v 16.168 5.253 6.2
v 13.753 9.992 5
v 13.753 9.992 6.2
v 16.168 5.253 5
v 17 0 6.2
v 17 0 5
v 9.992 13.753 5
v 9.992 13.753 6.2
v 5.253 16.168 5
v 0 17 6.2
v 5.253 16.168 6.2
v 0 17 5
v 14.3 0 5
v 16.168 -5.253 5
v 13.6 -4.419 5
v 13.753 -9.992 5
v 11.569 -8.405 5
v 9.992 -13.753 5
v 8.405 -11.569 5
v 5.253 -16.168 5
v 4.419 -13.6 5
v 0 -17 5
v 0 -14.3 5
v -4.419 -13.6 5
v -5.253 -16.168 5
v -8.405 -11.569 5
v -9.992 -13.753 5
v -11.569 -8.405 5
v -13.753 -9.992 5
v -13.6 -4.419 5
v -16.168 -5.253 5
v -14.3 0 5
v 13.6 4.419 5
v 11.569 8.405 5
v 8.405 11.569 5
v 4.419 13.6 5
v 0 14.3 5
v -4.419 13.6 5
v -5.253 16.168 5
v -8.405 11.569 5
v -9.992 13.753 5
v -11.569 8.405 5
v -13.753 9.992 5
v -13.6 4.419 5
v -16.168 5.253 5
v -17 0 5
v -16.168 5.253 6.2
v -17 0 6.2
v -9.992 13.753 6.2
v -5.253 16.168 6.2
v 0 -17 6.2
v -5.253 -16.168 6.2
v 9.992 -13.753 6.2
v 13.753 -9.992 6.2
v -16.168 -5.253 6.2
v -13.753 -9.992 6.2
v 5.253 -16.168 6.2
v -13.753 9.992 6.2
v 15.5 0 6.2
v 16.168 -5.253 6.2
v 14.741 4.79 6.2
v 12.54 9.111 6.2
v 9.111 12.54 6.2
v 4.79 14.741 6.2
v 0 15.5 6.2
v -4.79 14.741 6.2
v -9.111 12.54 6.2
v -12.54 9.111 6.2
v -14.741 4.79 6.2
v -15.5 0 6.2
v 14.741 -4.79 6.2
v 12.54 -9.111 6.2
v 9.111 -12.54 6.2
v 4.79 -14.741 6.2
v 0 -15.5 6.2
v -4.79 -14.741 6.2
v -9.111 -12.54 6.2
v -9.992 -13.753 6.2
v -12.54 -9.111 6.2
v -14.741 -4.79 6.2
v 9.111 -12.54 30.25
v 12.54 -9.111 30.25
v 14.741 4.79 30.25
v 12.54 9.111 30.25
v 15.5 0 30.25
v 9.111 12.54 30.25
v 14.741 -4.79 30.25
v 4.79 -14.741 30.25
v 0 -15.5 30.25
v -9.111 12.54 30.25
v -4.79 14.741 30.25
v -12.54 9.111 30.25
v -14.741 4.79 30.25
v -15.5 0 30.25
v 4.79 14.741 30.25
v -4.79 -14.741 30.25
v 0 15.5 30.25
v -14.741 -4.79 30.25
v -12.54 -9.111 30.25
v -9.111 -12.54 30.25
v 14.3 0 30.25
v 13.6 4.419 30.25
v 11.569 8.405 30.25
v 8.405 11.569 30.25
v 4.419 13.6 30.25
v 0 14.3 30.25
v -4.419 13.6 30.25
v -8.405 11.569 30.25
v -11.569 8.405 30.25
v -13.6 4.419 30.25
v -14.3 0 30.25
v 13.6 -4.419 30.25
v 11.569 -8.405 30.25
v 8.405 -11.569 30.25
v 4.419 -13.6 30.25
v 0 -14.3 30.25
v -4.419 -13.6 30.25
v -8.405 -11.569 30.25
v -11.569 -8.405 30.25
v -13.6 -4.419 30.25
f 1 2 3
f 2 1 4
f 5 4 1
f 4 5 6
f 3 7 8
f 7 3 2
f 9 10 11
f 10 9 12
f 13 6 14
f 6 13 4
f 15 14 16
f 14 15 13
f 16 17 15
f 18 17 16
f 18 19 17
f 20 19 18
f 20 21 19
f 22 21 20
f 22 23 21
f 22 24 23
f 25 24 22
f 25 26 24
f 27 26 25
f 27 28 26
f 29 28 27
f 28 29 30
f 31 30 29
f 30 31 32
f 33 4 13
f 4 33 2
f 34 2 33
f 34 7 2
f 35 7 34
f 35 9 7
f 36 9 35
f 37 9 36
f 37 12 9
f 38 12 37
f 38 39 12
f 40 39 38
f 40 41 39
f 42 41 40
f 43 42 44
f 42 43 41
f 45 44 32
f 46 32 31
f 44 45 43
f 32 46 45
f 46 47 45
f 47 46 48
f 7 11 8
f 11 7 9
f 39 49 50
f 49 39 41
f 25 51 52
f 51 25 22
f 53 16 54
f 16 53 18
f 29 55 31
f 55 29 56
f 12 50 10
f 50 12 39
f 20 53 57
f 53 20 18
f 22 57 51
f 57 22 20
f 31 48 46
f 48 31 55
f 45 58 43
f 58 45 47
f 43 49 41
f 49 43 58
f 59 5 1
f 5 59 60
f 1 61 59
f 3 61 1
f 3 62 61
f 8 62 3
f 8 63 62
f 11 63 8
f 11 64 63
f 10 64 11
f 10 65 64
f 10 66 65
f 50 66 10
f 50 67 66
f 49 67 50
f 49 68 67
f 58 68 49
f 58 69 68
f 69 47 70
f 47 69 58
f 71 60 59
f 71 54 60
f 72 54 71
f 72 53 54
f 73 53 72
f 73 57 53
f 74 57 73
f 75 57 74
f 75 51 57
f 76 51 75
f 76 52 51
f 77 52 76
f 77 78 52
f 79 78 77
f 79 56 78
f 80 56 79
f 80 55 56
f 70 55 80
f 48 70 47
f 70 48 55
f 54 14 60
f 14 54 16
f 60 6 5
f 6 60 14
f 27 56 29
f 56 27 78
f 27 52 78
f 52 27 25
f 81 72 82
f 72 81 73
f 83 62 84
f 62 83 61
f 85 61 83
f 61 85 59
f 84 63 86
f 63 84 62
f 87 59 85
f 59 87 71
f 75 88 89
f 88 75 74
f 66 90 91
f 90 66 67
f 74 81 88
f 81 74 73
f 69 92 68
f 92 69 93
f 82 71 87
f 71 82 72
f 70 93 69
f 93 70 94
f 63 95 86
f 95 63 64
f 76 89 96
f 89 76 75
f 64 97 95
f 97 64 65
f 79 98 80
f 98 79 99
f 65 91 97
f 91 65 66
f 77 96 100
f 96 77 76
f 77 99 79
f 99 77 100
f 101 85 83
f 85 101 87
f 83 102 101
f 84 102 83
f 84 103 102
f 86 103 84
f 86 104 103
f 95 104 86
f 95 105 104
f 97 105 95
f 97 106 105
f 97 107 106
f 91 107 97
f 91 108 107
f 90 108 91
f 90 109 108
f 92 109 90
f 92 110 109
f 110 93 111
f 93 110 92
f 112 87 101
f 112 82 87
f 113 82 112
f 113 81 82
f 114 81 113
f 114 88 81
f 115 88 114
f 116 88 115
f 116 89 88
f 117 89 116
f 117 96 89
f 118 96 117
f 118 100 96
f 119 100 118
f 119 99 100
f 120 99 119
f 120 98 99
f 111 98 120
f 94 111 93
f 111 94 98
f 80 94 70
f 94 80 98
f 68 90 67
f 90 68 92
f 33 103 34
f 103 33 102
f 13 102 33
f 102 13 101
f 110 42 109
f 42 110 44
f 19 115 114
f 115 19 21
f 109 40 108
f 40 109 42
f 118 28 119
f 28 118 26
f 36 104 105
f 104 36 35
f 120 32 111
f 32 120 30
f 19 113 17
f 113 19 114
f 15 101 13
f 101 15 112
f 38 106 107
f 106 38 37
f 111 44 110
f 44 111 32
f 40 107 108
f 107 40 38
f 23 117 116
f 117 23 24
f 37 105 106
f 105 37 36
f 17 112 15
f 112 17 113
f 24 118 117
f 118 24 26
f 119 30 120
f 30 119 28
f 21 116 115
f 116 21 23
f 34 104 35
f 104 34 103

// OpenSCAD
$fn=20;
//color([1,0,0]) colorbox();
color([0,0,1]) topcone();
//lid();

module colorbox(){
    difference(){union(){
    basebox();
    translate([(28.4-3.2)/2,(28.7-3.2)/2,2])cylinder(d=6,h=4,center=true);
    translate([(28.4-3.2)/2,-(28.7-3.2)/2,2])cylinder(d=6,h=4,center=true);
    translate([-(28.4-3.2)/2,(28.7-3.2)/2,2])cylinder(d=6,h=4,center=true);
    translate([-(28.4-3.2)/2,-(28.7-3.2)/2,2])cylinder(d=6,h=4,center=true);
    }
    translate([(28.4-3.2)/2,(28.7-3.2)/2,2])cylinder(d=2.4,h=5,center=true);
    translate([(28.4-3.2)/2,-(28.7-3.2)/2,2])cylinder(d=2.4,h=5,center=true);
    translate([-(28.4-3.2)/2,(28.7-3.2)/2,2])cylinder(d=2.4,h=5,center=true);
    translate([-(28.4-3.2)/2,-(28.7-3.2)/2,2])cylinder(d=2.4,h=5,center=true);
    translate([0,-(28.7-3.2)/2,0])cube([14,2,4],center=true);
    translate([0,(28.7-3.2)/2,0])cube([14,2,4],center=true);
    }
}


module lid(){
difference(){translate([-100+8,-48/2,0])import("bb-sen-uni-bt-c.stl");
    cylinder(h=20,d=32);
    translate([0,-20,(8-1.2)/2-0.205])cube([25,10,8-1.2],center=true);
    }
}
    
module topcone(){
    translate([0,0,5])difference()
    {union(){
        translate([0,0,0.6])cylinder(d=34,h=1.2,center=true);
        translate([0,0,25.25/2])cylinder(d=31,h=24+1.25,center=true);
        }
        translate([0,0,25.25/2])cylinder(d=31-2.4,h=24+1.25+0.2,center=true);
        }
    }
module basebox(){
    translate([-56/2,-48/2,0])difference(){linear_extrude(height=8) import("molebox.dxf",layer="0",convexity=10);
translate([0,0,1.25])linear_extrude(height=8) import("molebox.dxf",layer="innerbox",convexity=10);
translate([0,0,6.35])linear_extrude(height=8) import("molebox.dxf",layer="lid",convexity=10);
    translate([4,4,4]) doublehole();
    translate([4,4+16,4]) doublehole();
    translate([4,4+40,4]) doublehole();
    translate([4+48,4,4]) doublehole();
    translate([4+48,4+16,4]) doublehole();
    translate([4+48,4+40,4]) doublehole();
    translate([4+16,4+48,4]) rotate([0,0,90])doublehole();
    translate([4+32,4+48,4]) rotate([0,0,90])doublehole();
        translate([10,4+8,6.35-1.5]) cube([1.2,5.7,0.9],center=true);
        translate([10,4+28,6.35-1.5]) cube([1.2,5.7,0.9],center=true);
        translate([46,4+8,6.35-1.5]) cube([1.2,5.7,0.9],center=true);
        translate([46,4+28,6.35-1.5]) cube([1.2,5.7,0.9],center=true);
        translate([56/2,56-10,6.35-1.5]) cube([5.7,1.2,0.9],center=true);
    }
}
module doublehole(){
    union(){
        cylinder(d=4.8,h=9,center=true);
        rotate([90,0,0])cylinder(d=4.8,h=9,center=true);
        }
        }
